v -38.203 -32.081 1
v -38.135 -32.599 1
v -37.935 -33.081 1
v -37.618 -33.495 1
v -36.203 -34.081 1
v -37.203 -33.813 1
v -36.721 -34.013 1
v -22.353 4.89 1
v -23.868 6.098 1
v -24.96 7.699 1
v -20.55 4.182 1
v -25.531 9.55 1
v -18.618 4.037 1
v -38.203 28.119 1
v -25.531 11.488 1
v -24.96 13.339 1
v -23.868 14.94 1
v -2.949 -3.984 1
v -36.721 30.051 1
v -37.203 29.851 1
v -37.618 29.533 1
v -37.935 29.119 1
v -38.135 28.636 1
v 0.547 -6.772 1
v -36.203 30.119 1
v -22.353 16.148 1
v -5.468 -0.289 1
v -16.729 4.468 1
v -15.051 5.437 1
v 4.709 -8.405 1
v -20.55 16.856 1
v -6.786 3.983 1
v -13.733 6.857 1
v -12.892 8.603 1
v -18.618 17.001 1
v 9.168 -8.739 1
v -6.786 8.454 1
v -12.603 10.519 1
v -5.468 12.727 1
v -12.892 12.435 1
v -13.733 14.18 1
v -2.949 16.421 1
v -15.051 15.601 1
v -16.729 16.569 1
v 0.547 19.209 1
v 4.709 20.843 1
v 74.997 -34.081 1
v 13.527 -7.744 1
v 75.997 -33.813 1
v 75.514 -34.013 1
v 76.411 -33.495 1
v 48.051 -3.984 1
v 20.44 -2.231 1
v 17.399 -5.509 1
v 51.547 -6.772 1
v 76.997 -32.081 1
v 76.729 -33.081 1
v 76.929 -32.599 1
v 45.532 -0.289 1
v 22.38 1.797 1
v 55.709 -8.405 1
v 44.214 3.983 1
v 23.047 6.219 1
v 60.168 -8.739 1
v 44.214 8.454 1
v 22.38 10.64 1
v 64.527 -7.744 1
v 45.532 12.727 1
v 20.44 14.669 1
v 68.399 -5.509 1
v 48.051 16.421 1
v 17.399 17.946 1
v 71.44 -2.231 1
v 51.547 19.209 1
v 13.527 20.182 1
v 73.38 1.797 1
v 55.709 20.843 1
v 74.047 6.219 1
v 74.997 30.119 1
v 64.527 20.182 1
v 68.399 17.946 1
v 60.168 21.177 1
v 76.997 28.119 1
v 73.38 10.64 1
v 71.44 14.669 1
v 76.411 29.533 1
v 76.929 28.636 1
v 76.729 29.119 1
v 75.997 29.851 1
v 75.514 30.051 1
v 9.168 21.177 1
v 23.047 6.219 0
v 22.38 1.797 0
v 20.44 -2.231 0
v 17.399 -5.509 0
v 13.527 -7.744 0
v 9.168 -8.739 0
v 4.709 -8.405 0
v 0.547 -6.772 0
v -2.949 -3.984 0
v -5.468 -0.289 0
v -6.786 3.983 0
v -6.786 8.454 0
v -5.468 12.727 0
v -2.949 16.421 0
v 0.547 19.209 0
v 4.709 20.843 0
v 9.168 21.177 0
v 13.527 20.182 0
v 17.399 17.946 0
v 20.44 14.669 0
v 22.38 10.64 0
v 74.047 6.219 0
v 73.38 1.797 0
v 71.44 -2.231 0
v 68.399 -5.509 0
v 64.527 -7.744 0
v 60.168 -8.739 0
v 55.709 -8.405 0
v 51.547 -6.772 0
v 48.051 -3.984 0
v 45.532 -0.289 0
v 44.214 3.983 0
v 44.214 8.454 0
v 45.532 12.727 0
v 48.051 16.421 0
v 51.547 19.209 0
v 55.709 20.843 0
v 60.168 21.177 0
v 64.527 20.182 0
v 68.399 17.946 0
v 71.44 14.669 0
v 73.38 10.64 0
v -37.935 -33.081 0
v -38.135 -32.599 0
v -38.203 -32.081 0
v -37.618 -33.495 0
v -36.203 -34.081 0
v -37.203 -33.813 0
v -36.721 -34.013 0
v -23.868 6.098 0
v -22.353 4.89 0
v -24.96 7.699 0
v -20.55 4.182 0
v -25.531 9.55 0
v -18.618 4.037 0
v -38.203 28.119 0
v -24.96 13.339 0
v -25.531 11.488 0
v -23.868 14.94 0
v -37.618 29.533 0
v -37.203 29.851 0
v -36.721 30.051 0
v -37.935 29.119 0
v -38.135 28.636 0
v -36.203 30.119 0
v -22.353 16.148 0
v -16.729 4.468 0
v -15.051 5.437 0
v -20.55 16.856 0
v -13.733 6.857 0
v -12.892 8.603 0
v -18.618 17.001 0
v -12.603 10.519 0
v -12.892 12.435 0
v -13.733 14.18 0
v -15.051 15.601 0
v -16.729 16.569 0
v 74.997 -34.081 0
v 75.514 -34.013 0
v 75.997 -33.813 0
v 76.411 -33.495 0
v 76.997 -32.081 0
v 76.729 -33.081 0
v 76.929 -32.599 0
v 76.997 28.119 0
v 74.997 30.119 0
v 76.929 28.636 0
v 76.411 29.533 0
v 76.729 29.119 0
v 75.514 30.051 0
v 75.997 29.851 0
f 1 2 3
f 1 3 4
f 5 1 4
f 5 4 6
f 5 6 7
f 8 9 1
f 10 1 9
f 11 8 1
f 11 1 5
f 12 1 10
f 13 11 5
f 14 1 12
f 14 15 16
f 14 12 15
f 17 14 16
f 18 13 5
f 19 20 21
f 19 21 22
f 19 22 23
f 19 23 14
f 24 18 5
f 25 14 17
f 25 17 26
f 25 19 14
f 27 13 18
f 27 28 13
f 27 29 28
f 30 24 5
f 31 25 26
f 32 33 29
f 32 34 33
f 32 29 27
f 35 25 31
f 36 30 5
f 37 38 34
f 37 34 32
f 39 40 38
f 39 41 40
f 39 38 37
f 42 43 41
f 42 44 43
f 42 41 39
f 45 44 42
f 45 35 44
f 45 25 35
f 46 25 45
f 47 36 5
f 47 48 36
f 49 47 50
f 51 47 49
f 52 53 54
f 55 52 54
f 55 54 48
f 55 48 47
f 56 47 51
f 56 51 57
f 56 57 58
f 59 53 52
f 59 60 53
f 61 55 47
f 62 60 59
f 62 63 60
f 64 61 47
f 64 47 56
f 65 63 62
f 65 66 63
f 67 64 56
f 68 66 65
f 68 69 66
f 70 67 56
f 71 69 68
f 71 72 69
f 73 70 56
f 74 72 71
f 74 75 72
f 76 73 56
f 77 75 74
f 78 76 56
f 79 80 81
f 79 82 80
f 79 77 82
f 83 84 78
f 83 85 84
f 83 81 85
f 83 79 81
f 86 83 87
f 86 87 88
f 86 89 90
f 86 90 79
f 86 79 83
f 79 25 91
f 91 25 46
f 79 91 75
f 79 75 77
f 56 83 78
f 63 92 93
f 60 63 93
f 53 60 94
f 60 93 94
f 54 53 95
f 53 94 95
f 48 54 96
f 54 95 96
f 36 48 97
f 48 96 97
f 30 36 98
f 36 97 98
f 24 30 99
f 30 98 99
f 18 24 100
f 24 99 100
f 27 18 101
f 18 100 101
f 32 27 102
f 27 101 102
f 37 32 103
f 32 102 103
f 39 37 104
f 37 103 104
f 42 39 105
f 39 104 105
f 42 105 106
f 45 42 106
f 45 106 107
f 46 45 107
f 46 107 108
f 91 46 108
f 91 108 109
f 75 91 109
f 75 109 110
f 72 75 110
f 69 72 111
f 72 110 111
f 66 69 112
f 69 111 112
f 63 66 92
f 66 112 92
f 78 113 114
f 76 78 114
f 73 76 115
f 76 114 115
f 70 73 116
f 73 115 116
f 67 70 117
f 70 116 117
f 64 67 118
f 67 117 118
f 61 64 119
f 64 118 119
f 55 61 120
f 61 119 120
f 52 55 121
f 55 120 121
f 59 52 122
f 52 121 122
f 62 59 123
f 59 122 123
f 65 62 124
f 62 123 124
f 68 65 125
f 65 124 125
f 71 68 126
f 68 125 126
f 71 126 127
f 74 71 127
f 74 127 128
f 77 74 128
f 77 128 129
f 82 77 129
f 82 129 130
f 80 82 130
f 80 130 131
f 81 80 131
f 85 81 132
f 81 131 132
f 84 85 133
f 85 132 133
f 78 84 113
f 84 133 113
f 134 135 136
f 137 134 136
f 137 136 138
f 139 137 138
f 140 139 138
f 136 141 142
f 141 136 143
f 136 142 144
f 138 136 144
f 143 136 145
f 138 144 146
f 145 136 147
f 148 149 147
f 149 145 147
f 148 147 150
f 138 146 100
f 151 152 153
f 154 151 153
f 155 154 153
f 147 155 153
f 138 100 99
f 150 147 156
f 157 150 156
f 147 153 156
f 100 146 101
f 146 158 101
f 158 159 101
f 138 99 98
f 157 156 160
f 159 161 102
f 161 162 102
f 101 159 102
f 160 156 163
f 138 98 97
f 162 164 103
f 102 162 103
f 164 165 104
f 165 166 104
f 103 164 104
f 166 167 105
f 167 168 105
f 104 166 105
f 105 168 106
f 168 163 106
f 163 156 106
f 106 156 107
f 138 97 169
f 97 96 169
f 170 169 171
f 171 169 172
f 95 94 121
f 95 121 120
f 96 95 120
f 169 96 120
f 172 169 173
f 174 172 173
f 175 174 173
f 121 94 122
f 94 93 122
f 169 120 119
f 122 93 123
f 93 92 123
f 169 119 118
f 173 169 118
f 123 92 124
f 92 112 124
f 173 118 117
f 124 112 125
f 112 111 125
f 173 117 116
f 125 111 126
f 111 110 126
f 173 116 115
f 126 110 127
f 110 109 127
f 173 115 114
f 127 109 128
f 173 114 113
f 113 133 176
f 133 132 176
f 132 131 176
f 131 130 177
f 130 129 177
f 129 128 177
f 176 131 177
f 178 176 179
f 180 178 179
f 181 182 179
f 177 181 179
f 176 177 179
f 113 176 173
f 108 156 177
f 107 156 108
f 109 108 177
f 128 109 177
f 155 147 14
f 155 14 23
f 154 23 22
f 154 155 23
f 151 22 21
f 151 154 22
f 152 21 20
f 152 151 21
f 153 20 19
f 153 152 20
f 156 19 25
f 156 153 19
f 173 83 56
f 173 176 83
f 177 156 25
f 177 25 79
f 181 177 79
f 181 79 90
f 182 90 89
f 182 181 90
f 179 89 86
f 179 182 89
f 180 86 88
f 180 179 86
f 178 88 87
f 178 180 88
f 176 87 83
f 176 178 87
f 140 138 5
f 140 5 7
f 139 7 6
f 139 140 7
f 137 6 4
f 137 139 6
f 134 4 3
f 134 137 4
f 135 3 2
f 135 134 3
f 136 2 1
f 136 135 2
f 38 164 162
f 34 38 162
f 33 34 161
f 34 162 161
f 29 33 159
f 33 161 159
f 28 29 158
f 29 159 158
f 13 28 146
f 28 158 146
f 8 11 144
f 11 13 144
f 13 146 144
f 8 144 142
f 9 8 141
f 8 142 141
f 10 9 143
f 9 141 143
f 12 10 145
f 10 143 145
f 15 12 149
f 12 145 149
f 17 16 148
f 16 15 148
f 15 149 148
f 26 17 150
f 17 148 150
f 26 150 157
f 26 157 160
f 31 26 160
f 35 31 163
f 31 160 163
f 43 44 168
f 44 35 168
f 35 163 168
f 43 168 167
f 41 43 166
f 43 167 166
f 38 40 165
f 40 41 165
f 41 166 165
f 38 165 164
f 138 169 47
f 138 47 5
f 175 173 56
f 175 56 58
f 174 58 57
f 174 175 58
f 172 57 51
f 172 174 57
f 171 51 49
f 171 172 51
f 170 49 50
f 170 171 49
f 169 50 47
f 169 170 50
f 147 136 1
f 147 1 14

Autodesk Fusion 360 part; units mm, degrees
sketch "Esquisse1" plane through (0, 0, 0) normal (0, 0, 1) x (1, 0, 0)
  line L0 (74.9967, -34.0812) -> (-36.2033, -34.0812)
  circle A0 centre (59.0467, 6.2188) radius 15
  line L1 (76.9967, 28.1188) -> (76.9967, -32.0812)
  line L2 (-38.2033, -32.0812) -> (-38.2033, 28.1188)
  line L3 (74.8967, -31.9812) -> (-36.1033, -31.9812)
  line L4 (-36.2033, 30.1188) -> (74.9967, 30.1188)
  line L5 (-36.1033, 28.0188) -> (74.8967, 28.0188)
  line L6 (-36.1033, -31.9812) -> (-36.1033, 28.0188)
  circle A1 centre (8.0467, 6.2188) radius 15
  line L7 (74.8967, 28.0188) -> (74.8967, -31.9812)
  arc A2 (74.9967, -34.0812) -> (76.9967, -32.0812) centre (74.9967, -32.0812) ccw
  arc A3 (76.9967, 28.1188) -> (74.9967, 30.1188) centre (74.9967, 28.1188) ccw
  arc A4 (-36.2033, 30.1188) -> (-38.2033, 28.1188) centre (-36.2033, 28.1188) ccw
  arc A5 (-38.2033, -32.0812) -> (-36.2033, -34.0812) centre (-36.2033, -32.0812) ccw
  circle A6 centre (-19.1033, 10.5188) radius 6.5
  point P0 (-37.2797, 0.2421)
  dimension "d25" = 115.2
  dimension "d26" = 64.2
  dimension "d38" = 30
  dimension "d41" = 46.25
  dimension "d42" = 111
  dimension "d43" = 60
  dimension "d44" = 2.1
  dimension "d45" = 2.1
  dimension "d47" = 30
  dimension "d48" = 51
  dimension "d21" = 2
  dimension "d22" = 2
  dimension "d23" = 2
  dimension "d24" = 2
  dimension "d28" = 13
  dimension "d29" = 42.5
  dimension "d30" = 17
  dimension "d34" = 38.2
  dimension "d35" = 38.2
extrude "Extrusion1" add sketch "Esquisse1" along normal blind 1 contours L0 L1 L2 L4 A2 A3 A4 A5 | L3 L5 L6 L7
